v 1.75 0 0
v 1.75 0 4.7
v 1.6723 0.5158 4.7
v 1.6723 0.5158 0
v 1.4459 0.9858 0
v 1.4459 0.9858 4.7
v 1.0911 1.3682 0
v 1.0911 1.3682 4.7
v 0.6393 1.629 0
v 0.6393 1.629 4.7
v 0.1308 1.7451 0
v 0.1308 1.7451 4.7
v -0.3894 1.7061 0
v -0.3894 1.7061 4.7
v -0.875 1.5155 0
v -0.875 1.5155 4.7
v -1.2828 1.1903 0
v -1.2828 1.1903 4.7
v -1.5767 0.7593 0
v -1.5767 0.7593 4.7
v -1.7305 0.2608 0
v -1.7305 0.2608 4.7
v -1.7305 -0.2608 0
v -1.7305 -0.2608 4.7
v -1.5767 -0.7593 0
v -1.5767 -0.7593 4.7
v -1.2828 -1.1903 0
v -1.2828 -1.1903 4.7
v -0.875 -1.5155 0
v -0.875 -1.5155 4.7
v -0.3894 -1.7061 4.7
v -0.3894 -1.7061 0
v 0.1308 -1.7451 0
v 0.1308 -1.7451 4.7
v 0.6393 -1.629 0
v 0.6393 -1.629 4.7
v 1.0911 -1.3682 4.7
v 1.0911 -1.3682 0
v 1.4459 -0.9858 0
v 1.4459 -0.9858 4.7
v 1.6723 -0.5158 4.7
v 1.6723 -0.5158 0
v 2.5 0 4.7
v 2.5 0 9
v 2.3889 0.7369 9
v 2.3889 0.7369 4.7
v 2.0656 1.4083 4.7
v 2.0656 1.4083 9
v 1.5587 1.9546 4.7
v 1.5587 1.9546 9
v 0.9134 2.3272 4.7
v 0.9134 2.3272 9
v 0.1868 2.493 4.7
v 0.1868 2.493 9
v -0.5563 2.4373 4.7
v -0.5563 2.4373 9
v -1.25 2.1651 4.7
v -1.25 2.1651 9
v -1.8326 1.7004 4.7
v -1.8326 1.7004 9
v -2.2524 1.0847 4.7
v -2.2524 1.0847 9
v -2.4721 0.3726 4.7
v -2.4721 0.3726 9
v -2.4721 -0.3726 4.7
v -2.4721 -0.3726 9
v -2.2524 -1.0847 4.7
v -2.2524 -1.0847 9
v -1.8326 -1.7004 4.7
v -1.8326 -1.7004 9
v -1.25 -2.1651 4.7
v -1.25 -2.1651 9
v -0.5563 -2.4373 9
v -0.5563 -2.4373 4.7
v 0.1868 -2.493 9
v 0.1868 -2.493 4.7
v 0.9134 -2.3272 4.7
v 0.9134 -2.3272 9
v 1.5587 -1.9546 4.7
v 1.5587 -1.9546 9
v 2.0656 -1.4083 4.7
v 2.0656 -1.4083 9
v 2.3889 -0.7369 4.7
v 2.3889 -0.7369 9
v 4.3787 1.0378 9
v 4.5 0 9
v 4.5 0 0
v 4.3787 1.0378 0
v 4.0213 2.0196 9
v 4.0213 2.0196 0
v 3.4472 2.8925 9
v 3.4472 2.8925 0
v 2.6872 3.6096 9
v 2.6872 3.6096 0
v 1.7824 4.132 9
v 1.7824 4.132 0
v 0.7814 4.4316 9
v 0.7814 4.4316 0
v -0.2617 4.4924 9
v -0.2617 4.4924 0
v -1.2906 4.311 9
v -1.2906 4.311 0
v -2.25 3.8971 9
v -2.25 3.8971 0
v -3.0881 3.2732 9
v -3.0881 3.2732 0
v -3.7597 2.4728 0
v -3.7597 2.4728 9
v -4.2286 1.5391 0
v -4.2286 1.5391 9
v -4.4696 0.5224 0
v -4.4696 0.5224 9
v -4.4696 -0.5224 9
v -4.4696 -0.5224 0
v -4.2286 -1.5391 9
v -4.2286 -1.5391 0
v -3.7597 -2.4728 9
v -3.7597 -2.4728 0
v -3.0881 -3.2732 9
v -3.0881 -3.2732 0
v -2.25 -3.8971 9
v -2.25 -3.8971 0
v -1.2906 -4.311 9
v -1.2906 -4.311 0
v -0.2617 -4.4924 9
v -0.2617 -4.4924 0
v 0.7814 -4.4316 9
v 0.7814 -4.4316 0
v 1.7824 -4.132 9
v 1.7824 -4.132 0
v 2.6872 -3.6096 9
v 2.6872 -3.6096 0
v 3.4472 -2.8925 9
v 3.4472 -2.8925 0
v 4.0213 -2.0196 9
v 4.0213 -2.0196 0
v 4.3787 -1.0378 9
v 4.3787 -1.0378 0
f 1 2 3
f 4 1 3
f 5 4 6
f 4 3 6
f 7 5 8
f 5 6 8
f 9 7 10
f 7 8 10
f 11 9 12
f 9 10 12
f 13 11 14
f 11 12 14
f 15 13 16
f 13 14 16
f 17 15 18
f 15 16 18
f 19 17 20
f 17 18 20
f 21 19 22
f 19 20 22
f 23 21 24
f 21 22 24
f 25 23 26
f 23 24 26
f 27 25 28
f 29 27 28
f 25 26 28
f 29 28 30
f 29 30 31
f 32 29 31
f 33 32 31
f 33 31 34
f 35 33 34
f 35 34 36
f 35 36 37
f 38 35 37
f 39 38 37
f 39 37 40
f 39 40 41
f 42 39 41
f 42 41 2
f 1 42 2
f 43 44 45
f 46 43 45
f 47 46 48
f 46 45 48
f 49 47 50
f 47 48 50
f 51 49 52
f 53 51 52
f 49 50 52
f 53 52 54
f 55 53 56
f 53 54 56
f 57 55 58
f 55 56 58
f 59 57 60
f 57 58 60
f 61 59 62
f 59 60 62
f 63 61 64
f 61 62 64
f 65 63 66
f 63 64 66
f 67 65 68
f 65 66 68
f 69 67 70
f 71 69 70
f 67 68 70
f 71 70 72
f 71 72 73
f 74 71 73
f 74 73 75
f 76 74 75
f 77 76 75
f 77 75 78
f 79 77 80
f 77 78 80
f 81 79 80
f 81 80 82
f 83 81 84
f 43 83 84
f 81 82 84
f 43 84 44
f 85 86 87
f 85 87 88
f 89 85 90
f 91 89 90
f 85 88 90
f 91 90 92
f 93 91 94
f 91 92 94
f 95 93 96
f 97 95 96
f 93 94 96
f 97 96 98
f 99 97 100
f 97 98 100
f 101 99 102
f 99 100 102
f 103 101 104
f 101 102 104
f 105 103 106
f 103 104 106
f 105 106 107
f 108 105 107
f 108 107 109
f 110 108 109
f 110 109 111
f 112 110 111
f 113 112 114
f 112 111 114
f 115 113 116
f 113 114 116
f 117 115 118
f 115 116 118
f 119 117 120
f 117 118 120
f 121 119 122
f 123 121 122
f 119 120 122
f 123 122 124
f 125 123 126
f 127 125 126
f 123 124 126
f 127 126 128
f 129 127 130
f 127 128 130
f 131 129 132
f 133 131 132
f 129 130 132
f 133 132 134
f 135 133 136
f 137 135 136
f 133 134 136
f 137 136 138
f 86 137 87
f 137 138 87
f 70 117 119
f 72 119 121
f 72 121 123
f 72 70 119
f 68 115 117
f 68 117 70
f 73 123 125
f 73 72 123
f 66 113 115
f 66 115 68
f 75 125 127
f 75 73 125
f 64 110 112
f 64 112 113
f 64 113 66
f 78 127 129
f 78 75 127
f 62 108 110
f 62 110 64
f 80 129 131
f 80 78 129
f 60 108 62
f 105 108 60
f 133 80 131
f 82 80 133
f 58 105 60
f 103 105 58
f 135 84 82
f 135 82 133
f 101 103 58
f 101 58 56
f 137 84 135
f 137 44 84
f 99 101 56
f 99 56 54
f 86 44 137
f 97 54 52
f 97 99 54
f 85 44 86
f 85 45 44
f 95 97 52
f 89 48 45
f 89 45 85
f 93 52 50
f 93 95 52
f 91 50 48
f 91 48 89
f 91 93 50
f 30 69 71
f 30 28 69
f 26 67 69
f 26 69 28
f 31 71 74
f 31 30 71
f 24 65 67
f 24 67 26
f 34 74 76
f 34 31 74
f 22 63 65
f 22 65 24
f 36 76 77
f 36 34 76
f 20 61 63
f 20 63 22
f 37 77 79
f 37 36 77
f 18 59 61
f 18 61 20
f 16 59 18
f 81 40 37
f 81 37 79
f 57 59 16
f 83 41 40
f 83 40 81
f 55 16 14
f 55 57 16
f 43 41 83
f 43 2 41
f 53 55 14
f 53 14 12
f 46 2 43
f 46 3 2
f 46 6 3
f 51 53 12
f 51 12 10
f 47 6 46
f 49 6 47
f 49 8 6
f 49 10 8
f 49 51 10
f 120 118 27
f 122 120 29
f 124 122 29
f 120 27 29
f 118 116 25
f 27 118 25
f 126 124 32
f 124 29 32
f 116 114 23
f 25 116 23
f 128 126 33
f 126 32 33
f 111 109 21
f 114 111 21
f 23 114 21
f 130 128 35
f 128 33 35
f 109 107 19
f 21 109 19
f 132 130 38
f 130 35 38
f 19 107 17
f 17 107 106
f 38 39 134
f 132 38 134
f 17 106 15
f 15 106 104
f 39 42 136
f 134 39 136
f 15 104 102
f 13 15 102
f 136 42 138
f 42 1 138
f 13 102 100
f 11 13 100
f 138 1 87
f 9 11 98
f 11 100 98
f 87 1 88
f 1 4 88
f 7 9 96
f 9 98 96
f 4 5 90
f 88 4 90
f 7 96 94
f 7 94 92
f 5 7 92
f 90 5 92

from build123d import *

# Parameters (mm, degrees)
SKETCH1_R          = 4.5
INSERT_SHAPE_DEPTH = 9
SKETCH3_R          = 2.5
CENTER_HOLE_DEPTH  = 4.3
TAPPED_HOLE_REACH  = 9.911
SKETCH4_R          = 1.75


with BuildPart() as part:
    # Sketch1 → insert shape (new body)
    with BuildSketch(Plane.XY):
        Circle(SKETCH1_R)
    extrude(amount=INSERT_SHAPE_DEPTH)

    # Sketch3 → center hole (cut)
    with BuildSketch(Plane.XY.offset(9)):
        Circle(SKETCH3_R)
    extrude(amount=-CENTER_HOLE_DEPTH, mode=Mode.SUBTRACT)

    # Sketch4 → tapped hole (cut, up to next)
    with BuildSketch(Plane.XY.offset(4.7), mode=Mode.PRIVATE) as tapped_hole_sk1:
        Circle(SKETCH4_R)
    tapped_hole_tool1 = extrude(tapped_hole_sk1.sketch, amount=-TAPPED_HOLE_REACH, mode=Mode.PRIVATE) & part.part
    add(tapped_hole_tool1.solids().sort_by_distance((0, 0, 4.7))[0], mode=Mode.SUBTRACT)


solid = part.part
